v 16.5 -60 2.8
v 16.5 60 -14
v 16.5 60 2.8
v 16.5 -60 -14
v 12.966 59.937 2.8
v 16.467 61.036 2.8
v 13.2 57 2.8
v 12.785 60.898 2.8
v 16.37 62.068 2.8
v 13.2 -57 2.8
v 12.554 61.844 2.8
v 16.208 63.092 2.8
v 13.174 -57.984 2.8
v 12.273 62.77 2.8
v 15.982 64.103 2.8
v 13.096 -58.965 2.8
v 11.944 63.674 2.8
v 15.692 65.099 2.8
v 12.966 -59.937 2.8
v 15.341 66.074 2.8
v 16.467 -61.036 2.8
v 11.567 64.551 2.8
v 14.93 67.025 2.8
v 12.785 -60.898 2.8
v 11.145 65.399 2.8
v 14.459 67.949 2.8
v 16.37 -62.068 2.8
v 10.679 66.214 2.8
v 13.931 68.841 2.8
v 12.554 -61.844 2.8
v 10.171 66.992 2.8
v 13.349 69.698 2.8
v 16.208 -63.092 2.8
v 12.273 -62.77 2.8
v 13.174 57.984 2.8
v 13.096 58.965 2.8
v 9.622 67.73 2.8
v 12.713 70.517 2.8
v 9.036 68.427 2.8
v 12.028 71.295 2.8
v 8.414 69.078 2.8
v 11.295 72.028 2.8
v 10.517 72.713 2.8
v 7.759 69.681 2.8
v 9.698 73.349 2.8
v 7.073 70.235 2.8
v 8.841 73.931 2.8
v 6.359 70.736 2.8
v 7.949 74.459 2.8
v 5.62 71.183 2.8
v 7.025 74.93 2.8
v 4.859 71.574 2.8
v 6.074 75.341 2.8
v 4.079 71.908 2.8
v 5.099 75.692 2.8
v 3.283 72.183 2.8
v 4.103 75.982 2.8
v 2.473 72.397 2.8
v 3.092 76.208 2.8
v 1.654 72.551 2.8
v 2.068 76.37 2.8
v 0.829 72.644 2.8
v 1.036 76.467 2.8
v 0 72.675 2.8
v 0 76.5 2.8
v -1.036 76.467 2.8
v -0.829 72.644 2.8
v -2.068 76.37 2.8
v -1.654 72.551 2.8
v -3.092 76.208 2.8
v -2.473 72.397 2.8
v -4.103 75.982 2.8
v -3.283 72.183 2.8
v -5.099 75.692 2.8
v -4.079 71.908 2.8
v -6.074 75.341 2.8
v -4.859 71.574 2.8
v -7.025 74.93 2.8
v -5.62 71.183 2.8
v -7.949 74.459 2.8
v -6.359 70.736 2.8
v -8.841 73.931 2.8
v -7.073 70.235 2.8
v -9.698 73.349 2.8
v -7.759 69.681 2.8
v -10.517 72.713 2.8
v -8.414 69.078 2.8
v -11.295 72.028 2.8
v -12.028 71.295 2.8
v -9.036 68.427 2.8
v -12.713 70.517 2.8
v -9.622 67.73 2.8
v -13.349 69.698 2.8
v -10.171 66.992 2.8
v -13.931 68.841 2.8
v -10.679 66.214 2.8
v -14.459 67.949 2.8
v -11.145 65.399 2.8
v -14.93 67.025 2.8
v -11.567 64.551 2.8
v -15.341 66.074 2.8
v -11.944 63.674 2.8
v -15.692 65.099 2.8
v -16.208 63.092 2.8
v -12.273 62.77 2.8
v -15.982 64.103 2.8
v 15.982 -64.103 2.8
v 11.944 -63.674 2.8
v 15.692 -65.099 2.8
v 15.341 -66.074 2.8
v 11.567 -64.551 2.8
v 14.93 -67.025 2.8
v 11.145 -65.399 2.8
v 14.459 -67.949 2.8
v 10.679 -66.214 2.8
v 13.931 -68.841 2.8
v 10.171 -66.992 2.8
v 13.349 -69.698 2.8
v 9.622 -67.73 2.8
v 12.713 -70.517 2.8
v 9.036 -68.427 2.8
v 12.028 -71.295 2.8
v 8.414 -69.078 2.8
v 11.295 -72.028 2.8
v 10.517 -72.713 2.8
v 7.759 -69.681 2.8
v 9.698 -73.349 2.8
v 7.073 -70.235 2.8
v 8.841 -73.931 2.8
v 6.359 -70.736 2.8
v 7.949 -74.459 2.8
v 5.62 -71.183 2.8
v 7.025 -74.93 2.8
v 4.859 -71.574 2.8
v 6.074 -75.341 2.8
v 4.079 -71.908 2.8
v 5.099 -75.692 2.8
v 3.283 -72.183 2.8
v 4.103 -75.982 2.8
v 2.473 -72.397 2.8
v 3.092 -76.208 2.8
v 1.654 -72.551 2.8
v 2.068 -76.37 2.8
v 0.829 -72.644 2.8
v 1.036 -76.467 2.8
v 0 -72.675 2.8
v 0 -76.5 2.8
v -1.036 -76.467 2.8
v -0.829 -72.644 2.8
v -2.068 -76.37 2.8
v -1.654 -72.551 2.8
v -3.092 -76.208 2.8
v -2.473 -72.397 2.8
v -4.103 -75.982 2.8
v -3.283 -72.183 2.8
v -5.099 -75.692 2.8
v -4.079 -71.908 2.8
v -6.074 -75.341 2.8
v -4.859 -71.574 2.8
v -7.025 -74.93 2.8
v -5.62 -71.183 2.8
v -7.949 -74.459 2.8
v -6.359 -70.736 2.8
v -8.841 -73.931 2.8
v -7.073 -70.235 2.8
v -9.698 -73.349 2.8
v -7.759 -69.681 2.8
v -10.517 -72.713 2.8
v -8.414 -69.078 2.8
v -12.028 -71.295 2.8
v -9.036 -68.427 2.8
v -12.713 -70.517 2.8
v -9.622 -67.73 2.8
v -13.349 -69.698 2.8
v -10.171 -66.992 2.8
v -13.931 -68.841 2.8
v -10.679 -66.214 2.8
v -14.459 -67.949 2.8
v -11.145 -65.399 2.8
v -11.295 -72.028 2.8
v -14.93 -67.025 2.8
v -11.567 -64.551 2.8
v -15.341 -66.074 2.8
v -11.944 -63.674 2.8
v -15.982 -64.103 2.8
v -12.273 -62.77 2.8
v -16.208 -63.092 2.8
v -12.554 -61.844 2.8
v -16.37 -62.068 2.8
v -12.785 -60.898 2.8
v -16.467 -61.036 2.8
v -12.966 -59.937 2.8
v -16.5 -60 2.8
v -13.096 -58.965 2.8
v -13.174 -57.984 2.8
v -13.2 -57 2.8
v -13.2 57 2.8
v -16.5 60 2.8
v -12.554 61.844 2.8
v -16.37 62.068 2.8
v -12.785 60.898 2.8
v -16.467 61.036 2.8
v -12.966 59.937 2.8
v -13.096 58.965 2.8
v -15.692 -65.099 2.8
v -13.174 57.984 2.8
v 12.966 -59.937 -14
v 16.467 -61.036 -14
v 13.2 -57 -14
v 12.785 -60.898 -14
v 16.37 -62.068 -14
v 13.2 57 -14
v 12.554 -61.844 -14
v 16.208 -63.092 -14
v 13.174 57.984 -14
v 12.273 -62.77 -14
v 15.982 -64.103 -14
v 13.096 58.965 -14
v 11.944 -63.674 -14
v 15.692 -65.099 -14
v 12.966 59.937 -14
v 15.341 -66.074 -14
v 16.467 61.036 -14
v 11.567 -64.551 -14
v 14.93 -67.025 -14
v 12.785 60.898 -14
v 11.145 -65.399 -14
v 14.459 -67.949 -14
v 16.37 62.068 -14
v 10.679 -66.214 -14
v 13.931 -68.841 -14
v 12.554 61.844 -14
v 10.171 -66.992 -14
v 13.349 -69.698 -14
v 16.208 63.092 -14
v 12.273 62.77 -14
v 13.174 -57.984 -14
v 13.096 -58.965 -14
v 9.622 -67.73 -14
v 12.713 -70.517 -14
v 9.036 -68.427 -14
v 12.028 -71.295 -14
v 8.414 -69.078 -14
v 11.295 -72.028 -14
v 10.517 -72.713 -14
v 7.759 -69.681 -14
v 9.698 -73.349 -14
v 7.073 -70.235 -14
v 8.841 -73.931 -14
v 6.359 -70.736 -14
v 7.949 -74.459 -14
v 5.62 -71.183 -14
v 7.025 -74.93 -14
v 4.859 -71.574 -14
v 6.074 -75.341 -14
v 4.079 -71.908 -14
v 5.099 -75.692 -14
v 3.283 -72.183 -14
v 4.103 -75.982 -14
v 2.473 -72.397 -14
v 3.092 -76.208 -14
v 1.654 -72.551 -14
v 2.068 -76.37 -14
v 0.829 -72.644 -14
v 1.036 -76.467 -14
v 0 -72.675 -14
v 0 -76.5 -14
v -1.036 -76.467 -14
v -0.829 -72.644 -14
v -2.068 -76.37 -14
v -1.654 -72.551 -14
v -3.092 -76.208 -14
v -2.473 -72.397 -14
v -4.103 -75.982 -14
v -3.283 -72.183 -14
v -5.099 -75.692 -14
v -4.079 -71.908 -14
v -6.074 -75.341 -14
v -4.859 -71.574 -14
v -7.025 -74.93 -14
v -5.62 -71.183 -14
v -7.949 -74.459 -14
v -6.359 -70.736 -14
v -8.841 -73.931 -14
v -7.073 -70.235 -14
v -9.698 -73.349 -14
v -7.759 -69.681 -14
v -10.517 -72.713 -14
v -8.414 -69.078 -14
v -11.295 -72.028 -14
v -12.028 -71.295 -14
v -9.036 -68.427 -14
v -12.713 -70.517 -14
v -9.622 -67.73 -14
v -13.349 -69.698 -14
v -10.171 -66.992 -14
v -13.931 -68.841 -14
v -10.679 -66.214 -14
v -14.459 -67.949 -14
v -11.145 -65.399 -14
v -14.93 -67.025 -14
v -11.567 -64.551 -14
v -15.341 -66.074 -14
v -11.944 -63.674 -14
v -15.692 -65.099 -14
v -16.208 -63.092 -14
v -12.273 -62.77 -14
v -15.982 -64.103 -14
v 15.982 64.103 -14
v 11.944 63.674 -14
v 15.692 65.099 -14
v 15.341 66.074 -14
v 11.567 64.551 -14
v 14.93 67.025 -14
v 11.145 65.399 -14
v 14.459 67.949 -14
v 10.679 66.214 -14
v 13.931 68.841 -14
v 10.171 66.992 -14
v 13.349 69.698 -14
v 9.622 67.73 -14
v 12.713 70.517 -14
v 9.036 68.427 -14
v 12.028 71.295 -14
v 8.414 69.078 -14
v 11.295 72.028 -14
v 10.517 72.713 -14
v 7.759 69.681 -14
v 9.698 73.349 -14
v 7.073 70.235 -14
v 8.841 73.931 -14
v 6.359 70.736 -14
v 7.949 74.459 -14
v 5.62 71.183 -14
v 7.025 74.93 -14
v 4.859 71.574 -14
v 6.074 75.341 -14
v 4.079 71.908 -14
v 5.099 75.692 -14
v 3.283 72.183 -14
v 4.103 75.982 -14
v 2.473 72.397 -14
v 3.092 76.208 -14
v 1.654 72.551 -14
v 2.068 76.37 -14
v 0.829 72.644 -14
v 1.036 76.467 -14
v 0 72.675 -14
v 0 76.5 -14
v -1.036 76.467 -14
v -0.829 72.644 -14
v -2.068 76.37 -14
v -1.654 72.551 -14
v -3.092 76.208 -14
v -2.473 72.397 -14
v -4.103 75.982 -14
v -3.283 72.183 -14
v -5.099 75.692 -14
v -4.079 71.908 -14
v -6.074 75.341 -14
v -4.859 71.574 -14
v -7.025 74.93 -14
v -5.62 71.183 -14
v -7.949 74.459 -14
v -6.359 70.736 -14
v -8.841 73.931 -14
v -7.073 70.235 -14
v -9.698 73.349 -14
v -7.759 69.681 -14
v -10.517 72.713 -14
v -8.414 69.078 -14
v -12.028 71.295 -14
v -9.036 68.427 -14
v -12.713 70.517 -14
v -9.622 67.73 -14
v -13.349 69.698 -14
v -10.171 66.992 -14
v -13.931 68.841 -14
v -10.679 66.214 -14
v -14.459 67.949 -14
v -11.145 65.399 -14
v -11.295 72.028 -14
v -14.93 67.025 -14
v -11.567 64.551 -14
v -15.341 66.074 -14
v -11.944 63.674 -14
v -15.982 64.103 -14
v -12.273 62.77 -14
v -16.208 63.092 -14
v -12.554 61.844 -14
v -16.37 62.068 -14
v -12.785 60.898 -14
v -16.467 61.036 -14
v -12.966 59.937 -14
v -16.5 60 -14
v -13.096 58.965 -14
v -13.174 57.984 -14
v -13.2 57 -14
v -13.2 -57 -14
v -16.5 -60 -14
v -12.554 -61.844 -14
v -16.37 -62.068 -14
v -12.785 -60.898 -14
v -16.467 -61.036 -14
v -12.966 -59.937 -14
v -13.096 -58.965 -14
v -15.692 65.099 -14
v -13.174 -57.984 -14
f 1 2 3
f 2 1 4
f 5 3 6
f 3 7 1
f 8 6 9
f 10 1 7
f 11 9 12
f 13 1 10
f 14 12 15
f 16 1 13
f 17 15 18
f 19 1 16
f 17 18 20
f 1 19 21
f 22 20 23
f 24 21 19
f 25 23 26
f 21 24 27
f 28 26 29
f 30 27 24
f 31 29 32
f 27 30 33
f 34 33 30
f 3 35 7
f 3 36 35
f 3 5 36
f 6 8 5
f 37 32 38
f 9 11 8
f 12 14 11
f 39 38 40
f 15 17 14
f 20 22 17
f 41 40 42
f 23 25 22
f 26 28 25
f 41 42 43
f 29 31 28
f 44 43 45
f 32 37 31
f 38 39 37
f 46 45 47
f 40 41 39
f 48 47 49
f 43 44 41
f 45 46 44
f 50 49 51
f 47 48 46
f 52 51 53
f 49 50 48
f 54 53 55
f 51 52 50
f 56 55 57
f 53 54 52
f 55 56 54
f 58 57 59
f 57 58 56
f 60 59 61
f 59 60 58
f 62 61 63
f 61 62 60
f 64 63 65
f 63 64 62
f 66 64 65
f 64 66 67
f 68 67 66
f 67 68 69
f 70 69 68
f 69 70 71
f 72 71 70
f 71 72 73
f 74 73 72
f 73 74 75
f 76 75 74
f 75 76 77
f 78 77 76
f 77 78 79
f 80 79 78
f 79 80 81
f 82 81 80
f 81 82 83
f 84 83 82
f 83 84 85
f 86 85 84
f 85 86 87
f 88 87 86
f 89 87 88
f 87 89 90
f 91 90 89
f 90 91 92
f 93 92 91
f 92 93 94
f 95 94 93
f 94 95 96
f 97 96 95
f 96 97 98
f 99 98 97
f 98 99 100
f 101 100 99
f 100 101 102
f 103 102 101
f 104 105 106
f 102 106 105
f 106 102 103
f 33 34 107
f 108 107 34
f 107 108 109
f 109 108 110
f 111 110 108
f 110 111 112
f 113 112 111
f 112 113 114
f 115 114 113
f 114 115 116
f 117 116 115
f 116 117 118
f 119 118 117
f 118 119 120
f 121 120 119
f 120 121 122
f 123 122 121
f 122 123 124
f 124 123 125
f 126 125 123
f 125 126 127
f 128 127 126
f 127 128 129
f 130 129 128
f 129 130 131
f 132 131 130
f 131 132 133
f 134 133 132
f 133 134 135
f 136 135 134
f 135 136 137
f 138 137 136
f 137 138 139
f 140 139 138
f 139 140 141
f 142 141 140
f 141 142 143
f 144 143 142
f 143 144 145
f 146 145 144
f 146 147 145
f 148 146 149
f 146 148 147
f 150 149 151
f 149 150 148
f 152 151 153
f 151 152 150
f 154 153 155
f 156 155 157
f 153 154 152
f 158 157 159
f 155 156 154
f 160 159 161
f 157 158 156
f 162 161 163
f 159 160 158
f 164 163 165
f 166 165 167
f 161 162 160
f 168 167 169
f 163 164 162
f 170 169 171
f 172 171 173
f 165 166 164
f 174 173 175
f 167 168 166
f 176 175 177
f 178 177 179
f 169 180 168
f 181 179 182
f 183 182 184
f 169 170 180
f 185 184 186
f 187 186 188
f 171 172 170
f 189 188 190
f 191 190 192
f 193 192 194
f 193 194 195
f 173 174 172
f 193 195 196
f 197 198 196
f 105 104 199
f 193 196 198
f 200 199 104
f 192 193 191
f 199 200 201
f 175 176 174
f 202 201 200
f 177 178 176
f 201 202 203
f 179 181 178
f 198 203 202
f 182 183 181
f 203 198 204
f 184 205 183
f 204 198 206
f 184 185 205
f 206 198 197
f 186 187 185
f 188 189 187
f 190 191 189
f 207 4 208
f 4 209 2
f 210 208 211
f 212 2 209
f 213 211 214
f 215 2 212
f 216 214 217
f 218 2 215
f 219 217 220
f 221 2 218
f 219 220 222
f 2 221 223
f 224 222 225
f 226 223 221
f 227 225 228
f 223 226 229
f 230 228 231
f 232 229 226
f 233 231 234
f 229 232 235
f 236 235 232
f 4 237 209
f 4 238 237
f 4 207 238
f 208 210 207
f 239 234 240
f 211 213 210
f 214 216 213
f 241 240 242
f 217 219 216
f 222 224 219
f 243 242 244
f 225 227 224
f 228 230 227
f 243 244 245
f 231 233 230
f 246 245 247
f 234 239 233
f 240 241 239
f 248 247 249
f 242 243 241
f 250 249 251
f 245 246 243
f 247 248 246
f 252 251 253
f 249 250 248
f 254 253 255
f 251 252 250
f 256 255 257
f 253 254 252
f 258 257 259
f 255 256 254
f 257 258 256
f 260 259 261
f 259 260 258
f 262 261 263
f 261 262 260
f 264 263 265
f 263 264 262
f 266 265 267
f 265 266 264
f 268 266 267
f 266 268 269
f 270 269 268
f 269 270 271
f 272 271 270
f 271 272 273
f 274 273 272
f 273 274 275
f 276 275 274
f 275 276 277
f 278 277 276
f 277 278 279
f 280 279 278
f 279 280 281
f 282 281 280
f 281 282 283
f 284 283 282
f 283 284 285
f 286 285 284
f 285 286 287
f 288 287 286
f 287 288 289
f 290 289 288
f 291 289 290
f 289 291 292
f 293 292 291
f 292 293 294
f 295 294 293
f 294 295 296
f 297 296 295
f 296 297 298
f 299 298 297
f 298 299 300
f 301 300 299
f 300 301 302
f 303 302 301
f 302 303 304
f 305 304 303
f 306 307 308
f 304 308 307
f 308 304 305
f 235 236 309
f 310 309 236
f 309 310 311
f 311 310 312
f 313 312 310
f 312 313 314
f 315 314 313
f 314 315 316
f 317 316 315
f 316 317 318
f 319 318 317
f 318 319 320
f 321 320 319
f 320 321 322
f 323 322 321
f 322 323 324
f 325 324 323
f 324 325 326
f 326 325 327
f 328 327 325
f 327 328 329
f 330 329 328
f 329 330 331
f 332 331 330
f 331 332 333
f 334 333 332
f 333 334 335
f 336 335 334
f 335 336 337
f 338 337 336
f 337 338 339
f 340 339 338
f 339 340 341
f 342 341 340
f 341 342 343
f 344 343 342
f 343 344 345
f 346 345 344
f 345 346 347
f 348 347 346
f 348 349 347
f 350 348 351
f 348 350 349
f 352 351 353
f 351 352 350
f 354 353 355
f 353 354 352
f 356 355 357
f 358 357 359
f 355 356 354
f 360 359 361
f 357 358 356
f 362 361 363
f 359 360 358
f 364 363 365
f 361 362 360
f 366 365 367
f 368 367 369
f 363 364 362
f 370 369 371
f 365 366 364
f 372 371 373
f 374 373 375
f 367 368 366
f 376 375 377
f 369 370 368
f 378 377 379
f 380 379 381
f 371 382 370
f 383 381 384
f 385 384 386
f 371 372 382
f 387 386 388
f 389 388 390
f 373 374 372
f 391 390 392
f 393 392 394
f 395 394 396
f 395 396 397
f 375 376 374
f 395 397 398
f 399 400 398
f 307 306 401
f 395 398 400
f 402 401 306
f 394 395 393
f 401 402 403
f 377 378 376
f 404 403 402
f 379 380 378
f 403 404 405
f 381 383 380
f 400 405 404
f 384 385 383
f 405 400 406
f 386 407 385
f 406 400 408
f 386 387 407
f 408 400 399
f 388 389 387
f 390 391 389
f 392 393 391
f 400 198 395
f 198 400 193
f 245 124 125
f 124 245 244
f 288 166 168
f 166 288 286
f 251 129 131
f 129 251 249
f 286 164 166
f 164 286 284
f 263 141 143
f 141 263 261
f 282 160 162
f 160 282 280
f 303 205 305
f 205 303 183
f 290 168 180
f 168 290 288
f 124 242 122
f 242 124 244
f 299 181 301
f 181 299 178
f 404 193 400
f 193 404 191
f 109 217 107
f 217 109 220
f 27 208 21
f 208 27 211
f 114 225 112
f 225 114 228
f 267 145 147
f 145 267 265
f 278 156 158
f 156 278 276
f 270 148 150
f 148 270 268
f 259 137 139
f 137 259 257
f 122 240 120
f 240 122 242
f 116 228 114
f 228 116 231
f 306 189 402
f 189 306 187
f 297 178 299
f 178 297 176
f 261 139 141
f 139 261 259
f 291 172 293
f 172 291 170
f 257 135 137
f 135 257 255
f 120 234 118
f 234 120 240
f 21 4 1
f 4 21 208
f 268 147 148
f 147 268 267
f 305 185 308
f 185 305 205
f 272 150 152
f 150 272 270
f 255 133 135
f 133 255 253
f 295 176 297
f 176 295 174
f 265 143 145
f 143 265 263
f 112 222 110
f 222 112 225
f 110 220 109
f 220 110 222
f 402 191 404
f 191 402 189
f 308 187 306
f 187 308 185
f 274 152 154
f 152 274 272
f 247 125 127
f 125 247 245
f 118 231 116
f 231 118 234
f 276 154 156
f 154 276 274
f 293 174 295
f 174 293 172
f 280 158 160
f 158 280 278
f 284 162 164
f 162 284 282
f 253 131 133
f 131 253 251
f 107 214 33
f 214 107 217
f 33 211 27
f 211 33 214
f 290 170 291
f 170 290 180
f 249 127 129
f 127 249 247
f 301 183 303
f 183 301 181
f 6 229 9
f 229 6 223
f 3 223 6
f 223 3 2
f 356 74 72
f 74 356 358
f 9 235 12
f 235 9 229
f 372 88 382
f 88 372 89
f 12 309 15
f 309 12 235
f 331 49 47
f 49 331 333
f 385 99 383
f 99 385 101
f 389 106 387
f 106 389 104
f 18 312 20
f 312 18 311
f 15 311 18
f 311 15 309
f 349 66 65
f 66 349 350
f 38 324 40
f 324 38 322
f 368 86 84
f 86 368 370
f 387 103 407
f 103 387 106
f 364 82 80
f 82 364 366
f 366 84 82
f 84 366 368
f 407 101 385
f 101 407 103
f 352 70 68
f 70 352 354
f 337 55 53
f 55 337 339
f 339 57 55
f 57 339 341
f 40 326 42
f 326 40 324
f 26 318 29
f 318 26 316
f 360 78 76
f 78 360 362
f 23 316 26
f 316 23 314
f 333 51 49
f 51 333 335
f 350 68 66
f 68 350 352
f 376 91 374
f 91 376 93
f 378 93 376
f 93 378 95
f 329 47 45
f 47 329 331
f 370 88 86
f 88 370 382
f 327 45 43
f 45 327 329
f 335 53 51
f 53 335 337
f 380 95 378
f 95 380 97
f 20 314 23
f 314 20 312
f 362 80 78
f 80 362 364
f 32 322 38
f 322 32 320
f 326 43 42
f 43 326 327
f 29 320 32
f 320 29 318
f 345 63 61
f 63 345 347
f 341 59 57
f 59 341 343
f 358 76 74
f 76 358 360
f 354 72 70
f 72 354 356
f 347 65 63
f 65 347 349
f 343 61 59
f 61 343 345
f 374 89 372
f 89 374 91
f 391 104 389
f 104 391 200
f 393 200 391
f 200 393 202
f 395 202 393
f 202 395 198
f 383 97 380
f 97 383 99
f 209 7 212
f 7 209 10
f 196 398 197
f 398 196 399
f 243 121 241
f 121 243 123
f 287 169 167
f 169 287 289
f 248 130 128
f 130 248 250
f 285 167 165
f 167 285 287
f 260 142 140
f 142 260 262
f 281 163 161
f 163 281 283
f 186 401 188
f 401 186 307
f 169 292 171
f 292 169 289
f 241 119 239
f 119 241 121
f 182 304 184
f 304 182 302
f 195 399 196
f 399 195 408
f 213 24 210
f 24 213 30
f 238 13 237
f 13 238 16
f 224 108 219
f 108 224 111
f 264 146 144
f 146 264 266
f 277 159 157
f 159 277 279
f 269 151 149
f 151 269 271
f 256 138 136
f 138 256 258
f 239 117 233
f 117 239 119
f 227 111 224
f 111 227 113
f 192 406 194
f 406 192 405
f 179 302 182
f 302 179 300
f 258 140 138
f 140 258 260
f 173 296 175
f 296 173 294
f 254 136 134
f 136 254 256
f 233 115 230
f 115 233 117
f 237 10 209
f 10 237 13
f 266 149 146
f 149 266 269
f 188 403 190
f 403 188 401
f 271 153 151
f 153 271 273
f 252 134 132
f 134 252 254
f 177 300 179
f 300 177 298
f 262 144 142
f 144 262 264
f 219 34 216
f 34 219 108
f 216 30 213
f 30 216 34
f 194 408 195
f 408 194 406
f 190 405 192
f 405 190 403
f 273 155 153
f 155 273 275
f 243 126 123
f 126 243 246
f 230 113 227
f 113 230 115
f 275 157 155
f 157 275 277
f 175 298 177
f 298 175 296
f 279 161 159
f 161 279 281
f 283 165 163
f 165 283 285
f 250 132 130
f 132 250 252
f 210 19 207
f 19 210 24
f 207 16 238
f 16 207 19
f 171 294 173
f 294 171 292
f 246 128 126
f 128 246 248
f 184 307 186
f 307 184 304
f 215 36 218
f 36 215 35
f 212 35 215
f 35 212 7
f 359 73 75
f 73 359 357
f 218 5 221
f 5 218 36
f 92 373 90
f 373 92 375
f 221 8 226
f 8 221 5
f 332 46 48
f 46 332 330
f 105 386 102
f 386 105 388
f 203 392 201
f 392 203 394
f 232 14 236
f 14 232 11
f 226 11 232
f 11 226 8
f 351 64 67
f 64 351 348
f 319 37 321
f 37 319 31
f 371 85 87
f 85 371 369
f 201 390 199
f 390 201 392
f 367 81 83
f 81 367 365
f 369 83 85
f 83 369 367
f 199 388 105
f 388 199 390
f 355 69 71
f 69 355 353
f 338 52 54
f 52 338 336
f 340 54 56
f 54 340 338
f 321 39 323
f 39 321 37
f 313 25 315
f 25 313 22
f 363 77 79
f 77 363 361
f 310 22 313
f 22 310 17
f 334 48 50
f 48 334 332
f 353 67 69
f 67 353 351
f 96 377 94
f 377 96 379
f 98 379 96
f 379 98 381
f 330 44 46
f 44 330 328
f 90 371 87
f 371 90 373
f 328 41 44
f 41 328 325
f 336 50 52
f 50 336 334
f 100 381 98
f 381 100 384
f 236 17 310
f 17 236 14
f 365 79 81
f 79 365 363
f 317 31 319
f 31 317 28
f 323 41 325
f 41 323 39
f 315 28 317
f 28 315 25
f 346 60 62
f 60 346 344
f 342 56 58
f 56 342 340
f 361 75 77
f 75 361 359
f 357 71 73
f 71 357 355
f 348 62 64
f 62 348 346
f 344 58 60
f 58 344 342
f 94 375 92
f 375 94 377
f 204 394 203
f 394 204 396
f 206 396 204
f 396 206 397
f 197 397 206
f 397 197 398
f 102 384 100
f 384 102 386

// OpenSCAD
$fn = 100;
plate_depth = 2.8;
plate_length = 120;
plate_width = 33;

module base(){
    color("red")
    cube([plate_width,plate_length,plate_depth],center=true);
    color("red")
    
    translate([0,-plate_length/2,0])
    cylinder (h=plate_depth,d=plate_width,center=true);
    color("red")
    translate([0,plate_length/2,0])
    cylinder (h=plate_depth,d=plate_width,center=true);
}


module rez(){
    color("red")
    cube([plate_width,plate_length,plate_depth],center=true);
    color("red")
    translate([0,-plate_length/2,0])
    cylinder (h=plate_depth,d=plate_width,center=true);
    color("red")
    translate([0,plate_length/2,0])
    cylinder (h=plate_depth,d=plate_width,center=true);
}


module holes(){
    translate([0,-plate_length/2,0])
    cylinder(h=40,d=6.5,center=true);
    translate([0,plate_length/2,0])
    cylinder(h=40,d=6.5,center=true);
}
module rib(){
    module plate(){
    difference(){
        scale([1,1,3])
    base();
    holes();
    }
}
difference(){
    scale([1,1,2])
    translate([0,0,-2.8])
    plate();
    translate([0,0,-6])
    scale([0.8,0.95,10])
    rez();
}
}
rib();
